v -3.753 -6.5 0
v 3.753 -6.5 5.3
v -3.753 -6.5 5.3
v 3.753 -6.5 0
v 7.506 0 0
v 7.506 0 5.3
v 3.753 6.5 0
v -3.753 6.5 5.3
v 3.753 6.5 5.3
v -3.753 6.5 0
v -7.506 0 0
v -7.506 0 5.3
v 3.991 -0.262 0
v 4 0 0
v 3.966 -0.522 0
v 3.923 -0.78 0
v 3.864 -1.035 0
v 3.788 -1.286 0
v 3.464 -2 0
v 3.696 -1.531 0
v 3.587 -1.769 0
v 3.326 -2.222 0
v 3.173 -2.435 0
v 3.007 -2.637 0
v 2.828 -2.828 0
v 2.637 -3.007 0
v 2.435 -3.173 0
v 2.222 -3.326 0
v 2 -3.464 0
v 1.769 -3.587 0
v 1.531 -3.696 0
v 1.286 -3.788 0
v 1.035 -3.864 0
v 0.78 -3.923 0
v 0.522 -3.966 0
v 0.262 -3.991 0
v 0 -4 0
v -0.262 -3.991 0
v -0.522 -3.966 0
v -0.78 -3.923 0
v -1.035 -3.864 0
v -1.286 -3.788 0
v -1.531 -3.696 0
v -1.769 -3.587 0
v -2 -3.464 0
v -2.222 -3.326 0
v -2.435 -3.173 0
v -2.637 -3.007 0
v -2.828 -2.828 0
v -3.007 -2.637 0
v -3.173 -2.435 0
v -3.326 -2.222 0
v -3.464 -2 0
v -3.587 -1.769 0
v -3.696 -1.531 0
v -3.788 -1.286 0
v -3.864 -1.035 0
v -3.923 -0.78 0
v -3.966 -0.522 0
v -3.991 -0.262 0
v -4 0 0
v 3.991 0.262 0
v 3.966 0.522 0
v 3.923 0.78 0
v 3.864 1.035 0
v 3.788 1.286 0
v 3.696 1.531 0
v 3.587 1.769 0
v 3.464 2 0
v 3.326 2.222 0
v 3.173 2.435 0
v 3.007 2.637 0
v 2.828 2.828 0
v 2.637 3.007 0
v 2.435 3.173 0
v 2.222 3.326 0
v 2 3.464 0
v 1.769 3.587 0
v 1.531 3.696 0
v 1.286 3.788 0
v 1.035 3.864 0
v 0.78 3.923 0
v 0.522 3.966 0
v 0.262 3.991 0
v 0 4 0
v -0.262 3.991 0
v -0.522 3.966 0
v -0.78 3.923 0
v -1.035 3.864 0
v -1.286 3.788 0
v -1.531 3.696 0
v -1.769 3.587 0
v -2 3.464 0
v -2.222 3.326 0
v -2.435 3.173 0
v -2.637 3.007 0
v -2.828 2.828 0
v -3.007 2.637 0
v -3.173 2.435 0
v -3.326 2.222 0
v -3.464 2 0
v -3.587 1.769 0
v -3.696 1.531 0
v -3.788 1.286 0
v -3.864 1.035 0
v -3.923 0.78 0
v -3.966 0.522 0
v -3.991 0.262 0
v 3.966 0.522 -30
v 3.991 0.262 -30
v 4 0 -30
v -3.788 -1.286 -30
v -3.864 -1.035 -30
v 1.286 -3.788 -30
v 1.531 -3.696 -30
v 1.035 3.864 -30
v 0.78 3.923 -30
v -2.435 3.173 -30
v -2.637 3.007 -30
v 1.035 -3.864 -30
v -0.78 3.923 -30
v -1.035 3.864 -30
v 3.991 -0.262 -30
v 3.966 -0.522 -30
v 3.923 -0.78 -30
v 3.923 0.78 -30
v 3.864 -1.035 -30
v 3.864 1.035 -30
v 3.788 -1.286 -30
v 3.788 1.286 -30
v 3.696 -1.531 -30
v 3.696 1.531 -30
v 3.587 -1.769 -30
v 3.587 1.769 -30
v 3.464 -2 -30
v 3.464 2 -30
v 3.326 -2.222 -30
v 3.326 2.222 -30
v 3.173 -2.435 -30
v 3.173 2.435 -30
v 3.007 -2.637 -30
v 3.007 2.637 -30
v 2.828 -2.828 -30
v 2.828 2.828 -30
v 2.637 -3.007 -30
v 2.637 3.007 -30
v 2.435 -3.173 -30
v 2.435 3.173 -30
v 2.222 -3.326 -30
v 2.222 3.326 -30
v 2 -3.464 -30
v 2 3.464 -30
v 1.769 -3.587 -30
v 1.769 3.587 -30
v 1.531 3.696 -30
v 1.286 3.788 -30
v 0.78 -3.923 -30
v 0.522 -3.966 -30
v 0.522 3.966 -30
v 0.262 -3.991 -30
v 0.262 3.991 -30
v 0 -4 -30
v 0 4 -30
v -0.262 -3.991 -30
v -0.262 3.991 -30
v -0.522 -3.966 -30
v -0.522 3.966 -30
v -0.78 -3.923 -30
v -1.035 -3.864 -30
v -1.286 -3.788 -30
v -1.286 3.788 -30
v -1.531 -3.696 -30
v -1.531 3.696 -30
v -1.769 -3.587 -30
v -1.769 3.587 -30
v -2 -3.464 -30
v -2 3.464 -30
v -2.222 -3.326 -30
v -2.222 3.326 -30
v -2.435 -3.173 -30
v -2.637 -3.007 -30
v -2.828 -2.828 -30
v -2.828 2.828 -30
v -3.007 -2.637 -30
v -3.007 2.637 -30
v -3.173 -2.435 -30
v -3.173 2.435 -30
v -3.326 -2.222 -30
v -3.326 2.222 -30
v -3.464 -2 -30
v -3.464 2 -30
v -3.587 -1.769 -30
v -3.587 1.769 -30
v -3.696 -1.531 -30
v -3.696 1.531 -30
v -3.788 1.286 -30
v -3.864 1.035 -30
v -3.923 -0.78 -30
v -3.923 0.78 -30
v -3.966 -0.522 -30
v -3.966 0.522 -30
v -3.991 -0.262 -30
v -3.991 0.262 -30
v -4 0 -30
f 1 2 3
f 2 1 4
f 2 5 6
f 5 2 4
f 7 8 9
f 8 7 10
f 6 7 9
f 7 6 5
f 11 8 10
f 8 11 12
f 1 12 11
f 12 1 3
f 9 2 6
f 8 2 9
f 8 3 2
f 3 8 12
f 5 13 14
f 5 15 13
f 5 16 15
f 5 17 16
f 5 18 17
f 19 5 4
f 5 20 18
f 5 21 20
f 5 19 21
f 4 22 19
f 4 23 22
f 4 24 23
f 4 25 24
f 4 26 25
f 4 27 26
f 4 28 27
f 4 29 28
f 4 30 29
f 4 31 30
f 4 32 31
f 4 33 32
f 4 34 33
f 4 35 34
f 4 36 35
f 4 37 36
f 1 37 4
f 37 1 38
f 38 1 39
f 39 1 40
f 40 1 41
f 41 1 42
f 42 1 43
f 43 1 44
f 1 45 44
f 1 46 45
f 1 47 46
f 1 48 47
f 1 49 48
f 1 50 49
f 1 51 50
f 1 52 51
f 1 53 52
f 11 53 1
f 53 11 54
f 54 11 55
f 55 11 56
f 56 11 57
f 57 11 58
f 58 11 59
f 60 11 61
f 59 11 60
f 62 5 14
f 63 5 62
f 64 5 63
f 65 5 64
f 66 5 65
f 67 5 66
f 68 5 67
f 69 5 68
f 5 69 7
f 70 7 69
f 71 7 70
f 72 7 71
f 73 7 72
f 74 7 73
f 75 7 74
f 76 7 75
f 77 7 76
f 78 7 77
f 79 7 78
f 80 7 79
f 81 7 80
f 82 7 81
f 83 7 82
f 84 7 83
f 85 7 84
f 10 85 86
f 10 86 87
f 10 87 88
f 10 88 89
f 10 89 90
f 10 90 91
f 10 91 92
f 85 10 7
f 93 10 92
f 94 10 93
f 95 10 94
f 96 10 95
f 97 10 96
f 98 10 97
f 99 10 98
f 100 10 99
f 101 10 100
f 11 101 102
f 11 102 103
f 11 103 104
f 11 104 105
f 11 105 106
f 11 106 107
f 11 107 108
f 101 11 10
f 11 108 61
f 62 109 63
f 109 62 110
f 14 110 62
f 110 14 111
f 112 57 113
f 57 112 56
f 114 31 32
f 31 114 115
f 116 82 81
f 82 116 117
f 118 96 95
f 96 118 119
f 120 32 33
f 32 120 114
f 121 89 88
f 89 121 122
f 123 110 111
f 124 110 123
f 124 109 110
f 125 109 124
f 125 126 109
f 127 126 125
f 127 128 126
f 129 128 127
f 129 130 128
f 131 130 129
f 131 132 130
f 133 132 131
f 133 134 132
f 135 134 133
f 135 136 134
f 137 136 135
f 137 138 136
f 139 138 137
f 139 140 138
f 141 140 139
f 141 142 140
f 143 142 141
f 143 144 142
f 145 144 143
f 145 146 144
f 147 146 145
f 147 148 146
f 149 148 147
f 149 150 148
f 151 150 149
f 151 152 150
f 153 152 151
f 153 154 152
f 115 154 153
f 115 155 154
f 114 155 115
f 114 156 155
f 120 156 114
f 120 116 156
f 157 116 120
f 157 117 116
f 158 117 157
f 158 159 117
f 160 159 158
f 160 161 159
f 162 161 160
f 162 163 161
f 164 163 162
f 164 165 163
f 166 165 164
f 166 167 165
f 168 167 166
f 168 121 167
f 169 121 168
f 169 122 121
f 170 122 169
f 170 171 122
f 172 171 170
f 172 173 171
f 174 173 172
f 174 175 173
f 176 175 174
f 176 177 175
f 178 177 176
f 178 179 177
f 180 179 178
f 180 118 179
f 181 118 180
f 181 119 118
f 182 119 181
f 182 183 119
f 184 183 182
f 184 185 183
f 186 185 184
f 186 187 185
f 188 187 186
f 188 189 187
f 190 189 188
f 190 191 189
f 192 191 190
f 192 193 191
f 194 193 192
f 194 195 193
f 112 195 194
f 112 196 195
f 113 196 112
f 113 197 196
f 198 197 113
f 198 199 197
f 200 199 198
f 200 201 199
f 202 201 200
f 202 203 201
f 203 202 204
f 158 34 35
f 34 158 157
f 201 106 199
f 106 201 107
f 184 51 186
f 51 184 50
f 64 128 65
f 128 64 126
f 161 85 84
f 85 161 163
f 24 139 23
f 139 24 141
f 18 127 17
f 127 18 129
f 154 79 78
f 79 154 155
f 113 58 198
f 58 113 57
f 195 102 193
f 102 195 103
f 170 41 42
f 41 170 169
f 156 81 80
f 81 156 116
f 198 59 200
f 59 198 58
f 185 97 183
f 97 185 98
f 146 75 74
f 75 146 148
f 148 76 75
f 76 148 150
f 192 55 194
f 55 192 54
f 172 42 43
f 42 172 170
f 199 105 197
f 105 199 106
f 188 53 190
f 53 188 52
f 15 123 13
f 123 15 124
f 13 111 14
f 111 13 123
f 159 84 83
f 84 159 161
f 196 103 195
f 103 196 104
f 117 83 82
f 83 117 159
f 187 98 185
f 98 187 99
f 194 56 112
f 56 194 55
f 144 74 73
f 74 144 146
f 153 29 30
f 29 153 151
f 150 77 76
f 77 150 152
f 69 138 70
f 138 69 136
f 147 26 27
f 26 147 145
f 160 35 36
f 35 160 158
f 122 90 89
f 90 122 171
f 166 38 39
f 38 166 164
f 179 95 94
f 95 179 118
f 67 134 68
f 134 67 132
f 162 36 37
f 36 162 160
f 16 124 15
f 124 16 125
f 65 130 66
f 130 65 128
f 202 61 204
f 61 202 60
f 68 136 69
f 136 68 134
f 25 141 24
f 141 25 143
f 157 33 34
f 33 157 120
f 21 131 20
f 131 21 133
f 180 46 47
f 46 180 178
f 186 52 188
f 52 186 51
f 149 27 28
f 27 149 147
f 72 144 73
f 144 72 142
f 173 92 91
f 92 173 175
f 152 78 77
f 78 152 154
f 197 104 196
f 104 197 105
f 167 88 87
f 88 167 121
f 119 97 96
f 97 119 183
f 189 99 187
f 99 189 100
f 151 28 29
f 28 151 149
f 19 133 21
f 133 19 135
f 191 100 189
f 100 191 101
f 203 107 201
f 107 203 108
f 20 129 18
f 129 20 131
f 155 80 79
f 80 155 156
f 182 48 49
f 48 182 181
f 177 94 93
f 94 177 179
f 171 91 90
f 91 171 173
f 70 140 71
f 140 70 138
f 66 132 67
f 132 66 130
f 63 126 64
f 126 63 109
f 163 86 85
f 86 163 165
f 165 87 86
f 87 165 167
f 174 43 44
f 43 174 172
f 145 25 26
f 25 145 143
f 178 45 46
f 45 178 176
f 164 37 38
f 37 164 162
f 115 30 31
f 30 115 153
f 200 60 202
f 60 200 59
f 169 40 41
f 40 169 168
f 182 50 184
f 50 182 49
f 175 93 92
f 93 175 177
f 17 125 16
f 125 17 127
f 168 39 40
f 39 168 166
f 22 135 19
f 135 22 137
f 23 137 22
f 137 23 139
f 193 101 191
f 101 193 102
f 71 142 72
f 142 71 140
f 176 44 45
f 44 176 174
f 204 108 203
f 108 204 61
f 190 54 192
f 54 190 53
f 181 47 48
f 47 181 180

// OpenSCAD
// M8 六角ボルト（ねじ山省略）
// 単位: mm

head_across_flats = 13;
head_height = 5.3;
shank_diameter = 8;
shank_length = 30;

// 正六角形の外接円半径 = 対辺距離 / sqrt(3)
head_radius = head_across_flats / sqrt(3);

union() {
    // 頭部: z = 0 ～ 5.3
    cylinder(
        h = head_height,
        r = head_radius,
        center = false,
        $fn = 6
    );

    // シャンク: z = -30 ～ 0
    translate([0, 0, -shank_length])
        cylinder(
            h = shank_length,
            d = shank_diameter,
            center = false,
            $fn = 96
        );
}
